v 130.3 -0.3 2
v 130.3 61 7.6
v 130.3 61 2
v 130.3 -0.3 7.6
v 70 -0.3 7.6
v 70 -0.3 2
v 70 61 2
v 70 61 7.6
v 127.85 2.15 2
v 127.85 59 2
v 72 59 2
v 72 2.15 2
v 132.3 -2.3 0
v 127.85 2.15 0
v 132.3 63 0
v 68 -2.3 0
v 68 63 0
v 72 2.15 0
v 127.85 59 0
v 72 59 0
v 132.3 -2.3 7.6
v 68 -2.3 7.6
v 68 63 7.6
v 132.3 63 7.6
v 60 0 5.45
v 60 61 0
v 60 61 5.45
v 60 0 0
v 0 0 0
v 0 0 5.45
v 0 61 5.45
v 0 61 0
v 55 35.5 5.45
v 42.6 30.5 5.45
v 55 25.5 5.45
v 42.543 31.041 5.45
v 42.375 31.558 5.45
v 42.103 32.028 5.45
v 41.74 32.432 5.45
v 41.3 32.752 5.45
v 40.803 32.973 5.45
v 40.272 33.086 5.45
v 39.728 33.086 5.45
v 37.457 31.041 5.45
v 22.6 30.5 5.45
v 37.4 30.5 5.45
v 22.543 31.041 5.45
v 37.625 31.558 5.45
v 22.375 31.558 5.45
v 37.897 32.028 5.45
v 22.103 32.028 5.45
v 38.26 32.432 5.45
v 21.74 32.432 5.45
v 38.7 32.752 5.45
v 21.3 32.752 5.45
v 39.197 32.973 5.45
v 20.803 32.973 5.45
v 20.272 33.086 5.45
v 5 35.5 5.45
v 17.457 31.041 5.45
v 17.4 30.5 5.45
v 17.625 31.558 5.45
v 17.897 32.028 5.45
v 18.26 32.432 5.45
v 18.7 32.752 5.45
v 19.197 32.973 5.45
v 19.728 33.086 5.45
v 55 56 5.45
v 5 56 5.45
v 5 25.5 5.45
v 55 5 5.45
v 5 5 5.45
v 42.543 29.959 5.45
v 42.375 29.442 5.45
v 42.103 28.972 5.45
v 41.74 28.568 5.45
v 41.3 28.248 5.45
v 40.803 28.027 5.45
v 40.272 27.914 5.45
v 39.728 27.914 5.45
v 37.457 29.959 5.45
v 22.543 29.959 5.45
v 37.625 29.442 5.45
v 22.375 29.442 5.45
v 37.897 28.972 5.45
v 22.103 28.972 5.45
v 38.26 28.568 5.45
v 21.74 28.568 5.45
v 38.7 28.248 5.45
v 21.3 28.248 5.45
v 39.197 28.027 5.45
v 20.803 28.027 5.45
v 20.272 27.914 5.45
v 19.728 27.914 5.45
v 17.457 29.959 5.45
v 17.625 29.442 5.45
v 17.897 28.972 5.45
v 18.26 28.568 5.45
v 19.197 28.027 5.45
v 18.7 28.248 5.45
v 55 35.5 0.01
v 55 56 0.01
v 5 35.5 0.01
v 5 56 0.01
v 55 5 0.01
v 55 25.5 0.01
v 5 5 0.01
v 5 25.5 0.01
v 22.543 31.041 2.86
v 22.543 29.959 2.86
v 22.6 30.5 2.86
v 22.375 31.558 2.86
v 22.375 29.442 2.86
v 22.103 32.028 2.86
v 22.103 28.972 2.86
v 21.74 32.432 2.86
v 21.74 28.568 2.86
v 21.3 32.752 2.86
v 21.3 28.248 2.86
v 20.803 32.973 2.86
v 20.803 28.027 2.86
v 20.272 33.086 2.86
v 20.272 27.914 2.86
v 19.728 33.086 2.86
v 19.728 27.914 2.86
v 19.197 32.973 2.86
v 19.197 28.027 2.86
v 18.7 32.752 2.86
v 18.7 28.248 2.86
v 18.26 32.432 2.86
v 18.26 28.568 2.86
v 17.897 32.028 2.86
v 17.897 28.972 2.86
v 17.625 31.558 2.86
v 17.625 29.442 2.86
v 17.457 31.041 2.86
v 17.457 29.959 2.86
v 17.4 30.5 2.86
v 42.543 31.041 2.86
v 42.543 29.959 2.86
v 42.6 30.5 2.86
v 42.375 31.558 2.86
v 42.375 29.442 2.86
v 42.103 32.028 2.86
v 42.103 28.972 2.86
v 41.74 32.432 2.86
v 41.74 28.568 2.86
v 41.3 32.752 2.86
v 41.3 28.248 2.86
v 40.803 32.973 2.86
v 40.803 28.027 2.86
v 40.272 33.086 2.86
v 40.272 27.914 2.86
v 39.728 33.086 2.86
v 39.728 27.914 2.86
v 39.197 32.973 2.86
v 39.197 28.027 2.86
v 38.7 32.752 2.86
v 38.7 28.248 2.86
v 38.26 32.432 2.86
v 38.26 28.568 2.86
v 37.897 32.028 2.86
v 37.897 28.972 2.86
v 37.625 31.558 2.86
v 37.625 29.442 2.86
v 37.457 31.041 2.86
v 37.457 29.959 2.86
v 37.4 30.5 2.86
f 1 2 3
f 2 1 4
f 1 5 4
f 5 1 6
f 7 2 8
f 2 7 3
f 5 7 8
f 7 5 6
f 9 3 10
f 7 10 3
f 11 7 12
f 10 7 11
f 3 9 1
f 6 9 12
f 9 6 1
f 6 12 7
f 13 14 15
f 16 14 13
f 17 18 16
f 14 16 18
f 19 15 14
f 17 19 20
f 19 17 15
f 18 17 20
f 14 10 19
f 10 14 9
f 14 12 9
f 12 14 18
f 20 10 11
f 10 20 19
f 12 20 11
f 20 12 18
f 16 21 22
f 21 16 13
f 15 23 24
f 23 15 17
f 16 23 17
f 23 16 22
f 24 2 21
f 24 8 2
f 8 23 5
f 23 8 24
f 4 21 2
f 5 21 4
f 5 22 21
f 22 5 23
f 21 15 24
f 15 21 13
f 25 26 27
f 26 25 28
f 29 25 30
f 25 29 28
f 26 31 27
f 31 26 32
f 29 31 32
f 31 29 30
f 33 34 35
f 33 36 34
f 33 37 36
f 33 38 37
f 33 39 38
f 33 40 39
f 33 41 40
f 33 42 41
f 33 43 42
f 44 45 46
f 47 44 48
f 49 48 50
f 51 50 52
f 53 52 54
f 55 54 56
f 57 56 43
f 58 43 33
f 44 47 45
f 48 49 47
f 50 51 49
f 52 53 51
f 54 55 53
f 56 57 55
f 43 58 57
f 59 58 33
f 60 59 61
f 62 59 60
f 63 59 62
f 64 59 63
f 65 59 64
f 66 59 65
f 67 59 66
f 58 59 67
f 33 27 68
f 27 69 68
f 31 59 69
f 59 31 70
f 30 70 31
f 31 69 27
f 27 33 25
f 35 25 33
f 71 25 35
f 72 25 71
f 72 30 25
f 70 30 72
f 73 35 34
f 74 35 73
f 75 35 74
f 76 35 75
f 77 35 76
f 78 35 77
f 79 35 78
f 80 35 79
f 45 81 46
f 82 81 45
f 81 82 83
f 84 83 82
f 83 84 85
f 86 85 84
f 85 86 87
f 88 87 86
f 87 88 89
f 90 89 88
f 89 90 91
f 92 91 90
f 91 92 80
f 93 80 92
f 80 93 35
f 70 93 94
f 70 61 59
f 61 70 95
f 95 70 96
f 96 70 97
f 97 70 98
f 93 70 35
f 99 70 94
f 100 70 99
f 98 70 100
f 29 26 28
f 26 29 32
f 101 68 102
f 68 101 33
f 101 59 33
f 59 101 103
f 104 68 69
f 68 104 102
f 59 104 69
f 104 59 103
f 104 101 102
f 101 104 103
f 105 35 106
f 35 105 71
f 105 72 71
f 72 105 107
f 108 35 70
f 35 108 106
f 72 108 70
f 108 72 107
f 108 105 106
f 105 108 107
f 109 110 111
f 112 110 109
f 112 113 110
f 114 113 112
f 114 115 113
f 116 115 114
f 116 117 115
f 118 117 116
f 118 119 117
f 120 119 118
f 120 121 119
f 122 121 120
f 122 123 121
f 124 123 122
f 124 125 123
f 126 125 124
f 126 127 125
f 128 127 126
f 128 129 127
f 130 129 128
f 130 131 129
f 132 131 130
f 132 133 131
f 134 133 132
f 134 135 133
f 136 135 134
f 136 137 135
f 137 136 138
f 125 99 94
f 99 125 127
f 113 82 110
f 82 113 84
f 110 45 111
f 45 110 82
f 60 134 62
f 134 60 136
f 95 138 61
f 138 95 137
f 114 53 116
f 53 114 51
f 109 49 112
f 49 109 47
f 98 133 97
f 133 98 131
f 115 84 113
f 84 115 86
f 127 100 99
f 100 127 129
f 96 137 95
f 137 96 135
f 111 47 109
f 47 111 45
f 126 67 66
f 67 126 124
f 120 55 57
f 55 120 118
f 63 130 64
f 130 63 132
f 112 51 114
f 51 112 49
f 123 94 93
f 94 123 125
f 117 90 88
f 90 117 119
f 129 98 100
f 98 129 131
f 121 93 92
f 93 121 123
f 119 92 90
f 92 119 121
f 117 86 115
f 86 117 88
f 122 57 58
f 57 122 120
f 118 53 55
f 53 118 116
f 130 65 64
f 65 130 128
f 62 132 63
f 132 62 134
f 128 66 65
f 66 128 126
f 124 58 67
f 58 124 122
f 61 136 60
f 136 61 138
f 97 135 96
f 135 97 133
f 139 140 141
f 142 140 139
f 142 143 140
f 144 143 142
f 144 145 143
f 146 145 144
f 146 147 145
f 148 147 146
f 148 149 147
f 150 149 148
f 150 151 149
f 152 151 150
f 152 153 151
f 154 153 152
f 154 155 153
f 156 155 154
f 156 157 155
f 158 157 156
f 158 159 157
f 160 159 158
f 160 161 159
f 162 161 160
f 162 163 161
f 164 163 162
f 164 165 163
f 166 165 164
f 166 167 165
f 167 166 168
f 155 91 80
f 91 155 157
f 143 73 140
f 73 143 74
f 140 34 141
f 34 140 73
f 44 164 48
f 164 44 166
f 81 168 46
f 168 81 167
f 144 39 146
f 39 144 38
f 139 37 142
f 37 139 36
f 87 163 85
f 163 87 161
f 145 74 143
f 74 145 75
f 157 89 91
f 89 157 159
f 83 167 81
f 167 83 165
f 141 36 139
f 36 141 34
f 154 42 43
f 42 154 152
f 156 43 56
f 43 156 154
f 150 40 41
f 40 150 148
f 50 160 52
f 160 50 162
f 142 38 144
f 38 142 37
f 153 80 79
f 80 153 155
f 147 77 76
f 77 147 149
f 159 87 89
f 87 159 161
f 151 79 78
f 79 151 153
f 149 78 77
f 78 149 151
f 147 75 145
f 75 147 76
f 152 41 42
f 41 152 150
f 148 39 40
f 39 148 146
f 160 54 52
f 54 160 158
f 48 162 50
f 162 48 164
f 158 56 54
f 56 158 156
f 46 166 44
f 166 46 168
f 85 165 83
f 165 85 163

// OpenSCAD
$fs = .4;

front_depth = 2;
back_depth = 5.45;

picture_thickness = .1;
clearance = .15;
tab_padding = 2.5;

picture_width = 60;
picture_height = 61;

module front(picture_width, picture_height, border = 2) {
    translate([-front_depth, 0, -front_depth])
        cube([front_depth, front_depth+back_depth+clearance, picture_height + 2*clearance + 2*front_depth]);
    translate([picture_width+clearance*2, 0, -front_depth])
        cube([front_depth, front_depth+back_depth+clearance, picture_height + 2*clearance + 2*front_depth]);
    translate([0, 0, -front_depth])
        cube([picture_width+clearance*2, front_depth+back_depth+clearance, front_depth]);
    translate([0, 0, picture_height+clearance*2])
        cube([picture_width + 2*clearance, front_depth+back_depth+clearance, front_depth]);
    difference() {
        cube([picture_width+clearance*2, front_depth, picture_height+clearance*2]);
        translate([border, -.01, border])
            cube([picture_width - border*2-clearance, front_depth+.02, picture_height - border*2-clearance]);
    }
}


back_border = 2;

module back(picture_width, picture_height) {

    module magnet_hole() {
        rotate([90, 0, 0]) 
        cylinder(h = 2.6, d = 5.2, center = false);
    }
    difference() {
        cube([picture_width, back_depth, picture_height]);
        
        translate([5, .01, 5])
            cube([picture_width - 10, back_depth+.02, picture_height/2 - 10]);
        translate([5, .01, picture_height/2 + 5 ])
            cube([picture_width - 10, back_depth+.02, picture_height/2 - 10]);

        
        /*translate([picture_width/7, -.01, picture_height/8])
            cube([picture_width/7*5, back_depth+.02, picture_height/4]);
        translate([picture_width/7, -.01, picture_height/1.6])
            cube([picture_width/7*5, back_depth+.02, picture_height/4]);*/

        translate([picture_width/3, back_depth+.01, picture_height/2])
            magnet_hole();
        translate([picture_width/3*2, back_depth+.01, picture_height/2])
            magnet_hole();
    }
}

/*
translate([clearance, front_depth+clearance, clearance])
    back(picture_width, picture_height);
front(picture_width, picture_height);
*/

translate([picture_width + 10, picture_height, 0]) rotate([90,0,0]) color("red", 1) front(picture_width, picture_height);
translate([0, picture_height, 0]) rotate([90,0,0]) back(picture_width, picture_height);
